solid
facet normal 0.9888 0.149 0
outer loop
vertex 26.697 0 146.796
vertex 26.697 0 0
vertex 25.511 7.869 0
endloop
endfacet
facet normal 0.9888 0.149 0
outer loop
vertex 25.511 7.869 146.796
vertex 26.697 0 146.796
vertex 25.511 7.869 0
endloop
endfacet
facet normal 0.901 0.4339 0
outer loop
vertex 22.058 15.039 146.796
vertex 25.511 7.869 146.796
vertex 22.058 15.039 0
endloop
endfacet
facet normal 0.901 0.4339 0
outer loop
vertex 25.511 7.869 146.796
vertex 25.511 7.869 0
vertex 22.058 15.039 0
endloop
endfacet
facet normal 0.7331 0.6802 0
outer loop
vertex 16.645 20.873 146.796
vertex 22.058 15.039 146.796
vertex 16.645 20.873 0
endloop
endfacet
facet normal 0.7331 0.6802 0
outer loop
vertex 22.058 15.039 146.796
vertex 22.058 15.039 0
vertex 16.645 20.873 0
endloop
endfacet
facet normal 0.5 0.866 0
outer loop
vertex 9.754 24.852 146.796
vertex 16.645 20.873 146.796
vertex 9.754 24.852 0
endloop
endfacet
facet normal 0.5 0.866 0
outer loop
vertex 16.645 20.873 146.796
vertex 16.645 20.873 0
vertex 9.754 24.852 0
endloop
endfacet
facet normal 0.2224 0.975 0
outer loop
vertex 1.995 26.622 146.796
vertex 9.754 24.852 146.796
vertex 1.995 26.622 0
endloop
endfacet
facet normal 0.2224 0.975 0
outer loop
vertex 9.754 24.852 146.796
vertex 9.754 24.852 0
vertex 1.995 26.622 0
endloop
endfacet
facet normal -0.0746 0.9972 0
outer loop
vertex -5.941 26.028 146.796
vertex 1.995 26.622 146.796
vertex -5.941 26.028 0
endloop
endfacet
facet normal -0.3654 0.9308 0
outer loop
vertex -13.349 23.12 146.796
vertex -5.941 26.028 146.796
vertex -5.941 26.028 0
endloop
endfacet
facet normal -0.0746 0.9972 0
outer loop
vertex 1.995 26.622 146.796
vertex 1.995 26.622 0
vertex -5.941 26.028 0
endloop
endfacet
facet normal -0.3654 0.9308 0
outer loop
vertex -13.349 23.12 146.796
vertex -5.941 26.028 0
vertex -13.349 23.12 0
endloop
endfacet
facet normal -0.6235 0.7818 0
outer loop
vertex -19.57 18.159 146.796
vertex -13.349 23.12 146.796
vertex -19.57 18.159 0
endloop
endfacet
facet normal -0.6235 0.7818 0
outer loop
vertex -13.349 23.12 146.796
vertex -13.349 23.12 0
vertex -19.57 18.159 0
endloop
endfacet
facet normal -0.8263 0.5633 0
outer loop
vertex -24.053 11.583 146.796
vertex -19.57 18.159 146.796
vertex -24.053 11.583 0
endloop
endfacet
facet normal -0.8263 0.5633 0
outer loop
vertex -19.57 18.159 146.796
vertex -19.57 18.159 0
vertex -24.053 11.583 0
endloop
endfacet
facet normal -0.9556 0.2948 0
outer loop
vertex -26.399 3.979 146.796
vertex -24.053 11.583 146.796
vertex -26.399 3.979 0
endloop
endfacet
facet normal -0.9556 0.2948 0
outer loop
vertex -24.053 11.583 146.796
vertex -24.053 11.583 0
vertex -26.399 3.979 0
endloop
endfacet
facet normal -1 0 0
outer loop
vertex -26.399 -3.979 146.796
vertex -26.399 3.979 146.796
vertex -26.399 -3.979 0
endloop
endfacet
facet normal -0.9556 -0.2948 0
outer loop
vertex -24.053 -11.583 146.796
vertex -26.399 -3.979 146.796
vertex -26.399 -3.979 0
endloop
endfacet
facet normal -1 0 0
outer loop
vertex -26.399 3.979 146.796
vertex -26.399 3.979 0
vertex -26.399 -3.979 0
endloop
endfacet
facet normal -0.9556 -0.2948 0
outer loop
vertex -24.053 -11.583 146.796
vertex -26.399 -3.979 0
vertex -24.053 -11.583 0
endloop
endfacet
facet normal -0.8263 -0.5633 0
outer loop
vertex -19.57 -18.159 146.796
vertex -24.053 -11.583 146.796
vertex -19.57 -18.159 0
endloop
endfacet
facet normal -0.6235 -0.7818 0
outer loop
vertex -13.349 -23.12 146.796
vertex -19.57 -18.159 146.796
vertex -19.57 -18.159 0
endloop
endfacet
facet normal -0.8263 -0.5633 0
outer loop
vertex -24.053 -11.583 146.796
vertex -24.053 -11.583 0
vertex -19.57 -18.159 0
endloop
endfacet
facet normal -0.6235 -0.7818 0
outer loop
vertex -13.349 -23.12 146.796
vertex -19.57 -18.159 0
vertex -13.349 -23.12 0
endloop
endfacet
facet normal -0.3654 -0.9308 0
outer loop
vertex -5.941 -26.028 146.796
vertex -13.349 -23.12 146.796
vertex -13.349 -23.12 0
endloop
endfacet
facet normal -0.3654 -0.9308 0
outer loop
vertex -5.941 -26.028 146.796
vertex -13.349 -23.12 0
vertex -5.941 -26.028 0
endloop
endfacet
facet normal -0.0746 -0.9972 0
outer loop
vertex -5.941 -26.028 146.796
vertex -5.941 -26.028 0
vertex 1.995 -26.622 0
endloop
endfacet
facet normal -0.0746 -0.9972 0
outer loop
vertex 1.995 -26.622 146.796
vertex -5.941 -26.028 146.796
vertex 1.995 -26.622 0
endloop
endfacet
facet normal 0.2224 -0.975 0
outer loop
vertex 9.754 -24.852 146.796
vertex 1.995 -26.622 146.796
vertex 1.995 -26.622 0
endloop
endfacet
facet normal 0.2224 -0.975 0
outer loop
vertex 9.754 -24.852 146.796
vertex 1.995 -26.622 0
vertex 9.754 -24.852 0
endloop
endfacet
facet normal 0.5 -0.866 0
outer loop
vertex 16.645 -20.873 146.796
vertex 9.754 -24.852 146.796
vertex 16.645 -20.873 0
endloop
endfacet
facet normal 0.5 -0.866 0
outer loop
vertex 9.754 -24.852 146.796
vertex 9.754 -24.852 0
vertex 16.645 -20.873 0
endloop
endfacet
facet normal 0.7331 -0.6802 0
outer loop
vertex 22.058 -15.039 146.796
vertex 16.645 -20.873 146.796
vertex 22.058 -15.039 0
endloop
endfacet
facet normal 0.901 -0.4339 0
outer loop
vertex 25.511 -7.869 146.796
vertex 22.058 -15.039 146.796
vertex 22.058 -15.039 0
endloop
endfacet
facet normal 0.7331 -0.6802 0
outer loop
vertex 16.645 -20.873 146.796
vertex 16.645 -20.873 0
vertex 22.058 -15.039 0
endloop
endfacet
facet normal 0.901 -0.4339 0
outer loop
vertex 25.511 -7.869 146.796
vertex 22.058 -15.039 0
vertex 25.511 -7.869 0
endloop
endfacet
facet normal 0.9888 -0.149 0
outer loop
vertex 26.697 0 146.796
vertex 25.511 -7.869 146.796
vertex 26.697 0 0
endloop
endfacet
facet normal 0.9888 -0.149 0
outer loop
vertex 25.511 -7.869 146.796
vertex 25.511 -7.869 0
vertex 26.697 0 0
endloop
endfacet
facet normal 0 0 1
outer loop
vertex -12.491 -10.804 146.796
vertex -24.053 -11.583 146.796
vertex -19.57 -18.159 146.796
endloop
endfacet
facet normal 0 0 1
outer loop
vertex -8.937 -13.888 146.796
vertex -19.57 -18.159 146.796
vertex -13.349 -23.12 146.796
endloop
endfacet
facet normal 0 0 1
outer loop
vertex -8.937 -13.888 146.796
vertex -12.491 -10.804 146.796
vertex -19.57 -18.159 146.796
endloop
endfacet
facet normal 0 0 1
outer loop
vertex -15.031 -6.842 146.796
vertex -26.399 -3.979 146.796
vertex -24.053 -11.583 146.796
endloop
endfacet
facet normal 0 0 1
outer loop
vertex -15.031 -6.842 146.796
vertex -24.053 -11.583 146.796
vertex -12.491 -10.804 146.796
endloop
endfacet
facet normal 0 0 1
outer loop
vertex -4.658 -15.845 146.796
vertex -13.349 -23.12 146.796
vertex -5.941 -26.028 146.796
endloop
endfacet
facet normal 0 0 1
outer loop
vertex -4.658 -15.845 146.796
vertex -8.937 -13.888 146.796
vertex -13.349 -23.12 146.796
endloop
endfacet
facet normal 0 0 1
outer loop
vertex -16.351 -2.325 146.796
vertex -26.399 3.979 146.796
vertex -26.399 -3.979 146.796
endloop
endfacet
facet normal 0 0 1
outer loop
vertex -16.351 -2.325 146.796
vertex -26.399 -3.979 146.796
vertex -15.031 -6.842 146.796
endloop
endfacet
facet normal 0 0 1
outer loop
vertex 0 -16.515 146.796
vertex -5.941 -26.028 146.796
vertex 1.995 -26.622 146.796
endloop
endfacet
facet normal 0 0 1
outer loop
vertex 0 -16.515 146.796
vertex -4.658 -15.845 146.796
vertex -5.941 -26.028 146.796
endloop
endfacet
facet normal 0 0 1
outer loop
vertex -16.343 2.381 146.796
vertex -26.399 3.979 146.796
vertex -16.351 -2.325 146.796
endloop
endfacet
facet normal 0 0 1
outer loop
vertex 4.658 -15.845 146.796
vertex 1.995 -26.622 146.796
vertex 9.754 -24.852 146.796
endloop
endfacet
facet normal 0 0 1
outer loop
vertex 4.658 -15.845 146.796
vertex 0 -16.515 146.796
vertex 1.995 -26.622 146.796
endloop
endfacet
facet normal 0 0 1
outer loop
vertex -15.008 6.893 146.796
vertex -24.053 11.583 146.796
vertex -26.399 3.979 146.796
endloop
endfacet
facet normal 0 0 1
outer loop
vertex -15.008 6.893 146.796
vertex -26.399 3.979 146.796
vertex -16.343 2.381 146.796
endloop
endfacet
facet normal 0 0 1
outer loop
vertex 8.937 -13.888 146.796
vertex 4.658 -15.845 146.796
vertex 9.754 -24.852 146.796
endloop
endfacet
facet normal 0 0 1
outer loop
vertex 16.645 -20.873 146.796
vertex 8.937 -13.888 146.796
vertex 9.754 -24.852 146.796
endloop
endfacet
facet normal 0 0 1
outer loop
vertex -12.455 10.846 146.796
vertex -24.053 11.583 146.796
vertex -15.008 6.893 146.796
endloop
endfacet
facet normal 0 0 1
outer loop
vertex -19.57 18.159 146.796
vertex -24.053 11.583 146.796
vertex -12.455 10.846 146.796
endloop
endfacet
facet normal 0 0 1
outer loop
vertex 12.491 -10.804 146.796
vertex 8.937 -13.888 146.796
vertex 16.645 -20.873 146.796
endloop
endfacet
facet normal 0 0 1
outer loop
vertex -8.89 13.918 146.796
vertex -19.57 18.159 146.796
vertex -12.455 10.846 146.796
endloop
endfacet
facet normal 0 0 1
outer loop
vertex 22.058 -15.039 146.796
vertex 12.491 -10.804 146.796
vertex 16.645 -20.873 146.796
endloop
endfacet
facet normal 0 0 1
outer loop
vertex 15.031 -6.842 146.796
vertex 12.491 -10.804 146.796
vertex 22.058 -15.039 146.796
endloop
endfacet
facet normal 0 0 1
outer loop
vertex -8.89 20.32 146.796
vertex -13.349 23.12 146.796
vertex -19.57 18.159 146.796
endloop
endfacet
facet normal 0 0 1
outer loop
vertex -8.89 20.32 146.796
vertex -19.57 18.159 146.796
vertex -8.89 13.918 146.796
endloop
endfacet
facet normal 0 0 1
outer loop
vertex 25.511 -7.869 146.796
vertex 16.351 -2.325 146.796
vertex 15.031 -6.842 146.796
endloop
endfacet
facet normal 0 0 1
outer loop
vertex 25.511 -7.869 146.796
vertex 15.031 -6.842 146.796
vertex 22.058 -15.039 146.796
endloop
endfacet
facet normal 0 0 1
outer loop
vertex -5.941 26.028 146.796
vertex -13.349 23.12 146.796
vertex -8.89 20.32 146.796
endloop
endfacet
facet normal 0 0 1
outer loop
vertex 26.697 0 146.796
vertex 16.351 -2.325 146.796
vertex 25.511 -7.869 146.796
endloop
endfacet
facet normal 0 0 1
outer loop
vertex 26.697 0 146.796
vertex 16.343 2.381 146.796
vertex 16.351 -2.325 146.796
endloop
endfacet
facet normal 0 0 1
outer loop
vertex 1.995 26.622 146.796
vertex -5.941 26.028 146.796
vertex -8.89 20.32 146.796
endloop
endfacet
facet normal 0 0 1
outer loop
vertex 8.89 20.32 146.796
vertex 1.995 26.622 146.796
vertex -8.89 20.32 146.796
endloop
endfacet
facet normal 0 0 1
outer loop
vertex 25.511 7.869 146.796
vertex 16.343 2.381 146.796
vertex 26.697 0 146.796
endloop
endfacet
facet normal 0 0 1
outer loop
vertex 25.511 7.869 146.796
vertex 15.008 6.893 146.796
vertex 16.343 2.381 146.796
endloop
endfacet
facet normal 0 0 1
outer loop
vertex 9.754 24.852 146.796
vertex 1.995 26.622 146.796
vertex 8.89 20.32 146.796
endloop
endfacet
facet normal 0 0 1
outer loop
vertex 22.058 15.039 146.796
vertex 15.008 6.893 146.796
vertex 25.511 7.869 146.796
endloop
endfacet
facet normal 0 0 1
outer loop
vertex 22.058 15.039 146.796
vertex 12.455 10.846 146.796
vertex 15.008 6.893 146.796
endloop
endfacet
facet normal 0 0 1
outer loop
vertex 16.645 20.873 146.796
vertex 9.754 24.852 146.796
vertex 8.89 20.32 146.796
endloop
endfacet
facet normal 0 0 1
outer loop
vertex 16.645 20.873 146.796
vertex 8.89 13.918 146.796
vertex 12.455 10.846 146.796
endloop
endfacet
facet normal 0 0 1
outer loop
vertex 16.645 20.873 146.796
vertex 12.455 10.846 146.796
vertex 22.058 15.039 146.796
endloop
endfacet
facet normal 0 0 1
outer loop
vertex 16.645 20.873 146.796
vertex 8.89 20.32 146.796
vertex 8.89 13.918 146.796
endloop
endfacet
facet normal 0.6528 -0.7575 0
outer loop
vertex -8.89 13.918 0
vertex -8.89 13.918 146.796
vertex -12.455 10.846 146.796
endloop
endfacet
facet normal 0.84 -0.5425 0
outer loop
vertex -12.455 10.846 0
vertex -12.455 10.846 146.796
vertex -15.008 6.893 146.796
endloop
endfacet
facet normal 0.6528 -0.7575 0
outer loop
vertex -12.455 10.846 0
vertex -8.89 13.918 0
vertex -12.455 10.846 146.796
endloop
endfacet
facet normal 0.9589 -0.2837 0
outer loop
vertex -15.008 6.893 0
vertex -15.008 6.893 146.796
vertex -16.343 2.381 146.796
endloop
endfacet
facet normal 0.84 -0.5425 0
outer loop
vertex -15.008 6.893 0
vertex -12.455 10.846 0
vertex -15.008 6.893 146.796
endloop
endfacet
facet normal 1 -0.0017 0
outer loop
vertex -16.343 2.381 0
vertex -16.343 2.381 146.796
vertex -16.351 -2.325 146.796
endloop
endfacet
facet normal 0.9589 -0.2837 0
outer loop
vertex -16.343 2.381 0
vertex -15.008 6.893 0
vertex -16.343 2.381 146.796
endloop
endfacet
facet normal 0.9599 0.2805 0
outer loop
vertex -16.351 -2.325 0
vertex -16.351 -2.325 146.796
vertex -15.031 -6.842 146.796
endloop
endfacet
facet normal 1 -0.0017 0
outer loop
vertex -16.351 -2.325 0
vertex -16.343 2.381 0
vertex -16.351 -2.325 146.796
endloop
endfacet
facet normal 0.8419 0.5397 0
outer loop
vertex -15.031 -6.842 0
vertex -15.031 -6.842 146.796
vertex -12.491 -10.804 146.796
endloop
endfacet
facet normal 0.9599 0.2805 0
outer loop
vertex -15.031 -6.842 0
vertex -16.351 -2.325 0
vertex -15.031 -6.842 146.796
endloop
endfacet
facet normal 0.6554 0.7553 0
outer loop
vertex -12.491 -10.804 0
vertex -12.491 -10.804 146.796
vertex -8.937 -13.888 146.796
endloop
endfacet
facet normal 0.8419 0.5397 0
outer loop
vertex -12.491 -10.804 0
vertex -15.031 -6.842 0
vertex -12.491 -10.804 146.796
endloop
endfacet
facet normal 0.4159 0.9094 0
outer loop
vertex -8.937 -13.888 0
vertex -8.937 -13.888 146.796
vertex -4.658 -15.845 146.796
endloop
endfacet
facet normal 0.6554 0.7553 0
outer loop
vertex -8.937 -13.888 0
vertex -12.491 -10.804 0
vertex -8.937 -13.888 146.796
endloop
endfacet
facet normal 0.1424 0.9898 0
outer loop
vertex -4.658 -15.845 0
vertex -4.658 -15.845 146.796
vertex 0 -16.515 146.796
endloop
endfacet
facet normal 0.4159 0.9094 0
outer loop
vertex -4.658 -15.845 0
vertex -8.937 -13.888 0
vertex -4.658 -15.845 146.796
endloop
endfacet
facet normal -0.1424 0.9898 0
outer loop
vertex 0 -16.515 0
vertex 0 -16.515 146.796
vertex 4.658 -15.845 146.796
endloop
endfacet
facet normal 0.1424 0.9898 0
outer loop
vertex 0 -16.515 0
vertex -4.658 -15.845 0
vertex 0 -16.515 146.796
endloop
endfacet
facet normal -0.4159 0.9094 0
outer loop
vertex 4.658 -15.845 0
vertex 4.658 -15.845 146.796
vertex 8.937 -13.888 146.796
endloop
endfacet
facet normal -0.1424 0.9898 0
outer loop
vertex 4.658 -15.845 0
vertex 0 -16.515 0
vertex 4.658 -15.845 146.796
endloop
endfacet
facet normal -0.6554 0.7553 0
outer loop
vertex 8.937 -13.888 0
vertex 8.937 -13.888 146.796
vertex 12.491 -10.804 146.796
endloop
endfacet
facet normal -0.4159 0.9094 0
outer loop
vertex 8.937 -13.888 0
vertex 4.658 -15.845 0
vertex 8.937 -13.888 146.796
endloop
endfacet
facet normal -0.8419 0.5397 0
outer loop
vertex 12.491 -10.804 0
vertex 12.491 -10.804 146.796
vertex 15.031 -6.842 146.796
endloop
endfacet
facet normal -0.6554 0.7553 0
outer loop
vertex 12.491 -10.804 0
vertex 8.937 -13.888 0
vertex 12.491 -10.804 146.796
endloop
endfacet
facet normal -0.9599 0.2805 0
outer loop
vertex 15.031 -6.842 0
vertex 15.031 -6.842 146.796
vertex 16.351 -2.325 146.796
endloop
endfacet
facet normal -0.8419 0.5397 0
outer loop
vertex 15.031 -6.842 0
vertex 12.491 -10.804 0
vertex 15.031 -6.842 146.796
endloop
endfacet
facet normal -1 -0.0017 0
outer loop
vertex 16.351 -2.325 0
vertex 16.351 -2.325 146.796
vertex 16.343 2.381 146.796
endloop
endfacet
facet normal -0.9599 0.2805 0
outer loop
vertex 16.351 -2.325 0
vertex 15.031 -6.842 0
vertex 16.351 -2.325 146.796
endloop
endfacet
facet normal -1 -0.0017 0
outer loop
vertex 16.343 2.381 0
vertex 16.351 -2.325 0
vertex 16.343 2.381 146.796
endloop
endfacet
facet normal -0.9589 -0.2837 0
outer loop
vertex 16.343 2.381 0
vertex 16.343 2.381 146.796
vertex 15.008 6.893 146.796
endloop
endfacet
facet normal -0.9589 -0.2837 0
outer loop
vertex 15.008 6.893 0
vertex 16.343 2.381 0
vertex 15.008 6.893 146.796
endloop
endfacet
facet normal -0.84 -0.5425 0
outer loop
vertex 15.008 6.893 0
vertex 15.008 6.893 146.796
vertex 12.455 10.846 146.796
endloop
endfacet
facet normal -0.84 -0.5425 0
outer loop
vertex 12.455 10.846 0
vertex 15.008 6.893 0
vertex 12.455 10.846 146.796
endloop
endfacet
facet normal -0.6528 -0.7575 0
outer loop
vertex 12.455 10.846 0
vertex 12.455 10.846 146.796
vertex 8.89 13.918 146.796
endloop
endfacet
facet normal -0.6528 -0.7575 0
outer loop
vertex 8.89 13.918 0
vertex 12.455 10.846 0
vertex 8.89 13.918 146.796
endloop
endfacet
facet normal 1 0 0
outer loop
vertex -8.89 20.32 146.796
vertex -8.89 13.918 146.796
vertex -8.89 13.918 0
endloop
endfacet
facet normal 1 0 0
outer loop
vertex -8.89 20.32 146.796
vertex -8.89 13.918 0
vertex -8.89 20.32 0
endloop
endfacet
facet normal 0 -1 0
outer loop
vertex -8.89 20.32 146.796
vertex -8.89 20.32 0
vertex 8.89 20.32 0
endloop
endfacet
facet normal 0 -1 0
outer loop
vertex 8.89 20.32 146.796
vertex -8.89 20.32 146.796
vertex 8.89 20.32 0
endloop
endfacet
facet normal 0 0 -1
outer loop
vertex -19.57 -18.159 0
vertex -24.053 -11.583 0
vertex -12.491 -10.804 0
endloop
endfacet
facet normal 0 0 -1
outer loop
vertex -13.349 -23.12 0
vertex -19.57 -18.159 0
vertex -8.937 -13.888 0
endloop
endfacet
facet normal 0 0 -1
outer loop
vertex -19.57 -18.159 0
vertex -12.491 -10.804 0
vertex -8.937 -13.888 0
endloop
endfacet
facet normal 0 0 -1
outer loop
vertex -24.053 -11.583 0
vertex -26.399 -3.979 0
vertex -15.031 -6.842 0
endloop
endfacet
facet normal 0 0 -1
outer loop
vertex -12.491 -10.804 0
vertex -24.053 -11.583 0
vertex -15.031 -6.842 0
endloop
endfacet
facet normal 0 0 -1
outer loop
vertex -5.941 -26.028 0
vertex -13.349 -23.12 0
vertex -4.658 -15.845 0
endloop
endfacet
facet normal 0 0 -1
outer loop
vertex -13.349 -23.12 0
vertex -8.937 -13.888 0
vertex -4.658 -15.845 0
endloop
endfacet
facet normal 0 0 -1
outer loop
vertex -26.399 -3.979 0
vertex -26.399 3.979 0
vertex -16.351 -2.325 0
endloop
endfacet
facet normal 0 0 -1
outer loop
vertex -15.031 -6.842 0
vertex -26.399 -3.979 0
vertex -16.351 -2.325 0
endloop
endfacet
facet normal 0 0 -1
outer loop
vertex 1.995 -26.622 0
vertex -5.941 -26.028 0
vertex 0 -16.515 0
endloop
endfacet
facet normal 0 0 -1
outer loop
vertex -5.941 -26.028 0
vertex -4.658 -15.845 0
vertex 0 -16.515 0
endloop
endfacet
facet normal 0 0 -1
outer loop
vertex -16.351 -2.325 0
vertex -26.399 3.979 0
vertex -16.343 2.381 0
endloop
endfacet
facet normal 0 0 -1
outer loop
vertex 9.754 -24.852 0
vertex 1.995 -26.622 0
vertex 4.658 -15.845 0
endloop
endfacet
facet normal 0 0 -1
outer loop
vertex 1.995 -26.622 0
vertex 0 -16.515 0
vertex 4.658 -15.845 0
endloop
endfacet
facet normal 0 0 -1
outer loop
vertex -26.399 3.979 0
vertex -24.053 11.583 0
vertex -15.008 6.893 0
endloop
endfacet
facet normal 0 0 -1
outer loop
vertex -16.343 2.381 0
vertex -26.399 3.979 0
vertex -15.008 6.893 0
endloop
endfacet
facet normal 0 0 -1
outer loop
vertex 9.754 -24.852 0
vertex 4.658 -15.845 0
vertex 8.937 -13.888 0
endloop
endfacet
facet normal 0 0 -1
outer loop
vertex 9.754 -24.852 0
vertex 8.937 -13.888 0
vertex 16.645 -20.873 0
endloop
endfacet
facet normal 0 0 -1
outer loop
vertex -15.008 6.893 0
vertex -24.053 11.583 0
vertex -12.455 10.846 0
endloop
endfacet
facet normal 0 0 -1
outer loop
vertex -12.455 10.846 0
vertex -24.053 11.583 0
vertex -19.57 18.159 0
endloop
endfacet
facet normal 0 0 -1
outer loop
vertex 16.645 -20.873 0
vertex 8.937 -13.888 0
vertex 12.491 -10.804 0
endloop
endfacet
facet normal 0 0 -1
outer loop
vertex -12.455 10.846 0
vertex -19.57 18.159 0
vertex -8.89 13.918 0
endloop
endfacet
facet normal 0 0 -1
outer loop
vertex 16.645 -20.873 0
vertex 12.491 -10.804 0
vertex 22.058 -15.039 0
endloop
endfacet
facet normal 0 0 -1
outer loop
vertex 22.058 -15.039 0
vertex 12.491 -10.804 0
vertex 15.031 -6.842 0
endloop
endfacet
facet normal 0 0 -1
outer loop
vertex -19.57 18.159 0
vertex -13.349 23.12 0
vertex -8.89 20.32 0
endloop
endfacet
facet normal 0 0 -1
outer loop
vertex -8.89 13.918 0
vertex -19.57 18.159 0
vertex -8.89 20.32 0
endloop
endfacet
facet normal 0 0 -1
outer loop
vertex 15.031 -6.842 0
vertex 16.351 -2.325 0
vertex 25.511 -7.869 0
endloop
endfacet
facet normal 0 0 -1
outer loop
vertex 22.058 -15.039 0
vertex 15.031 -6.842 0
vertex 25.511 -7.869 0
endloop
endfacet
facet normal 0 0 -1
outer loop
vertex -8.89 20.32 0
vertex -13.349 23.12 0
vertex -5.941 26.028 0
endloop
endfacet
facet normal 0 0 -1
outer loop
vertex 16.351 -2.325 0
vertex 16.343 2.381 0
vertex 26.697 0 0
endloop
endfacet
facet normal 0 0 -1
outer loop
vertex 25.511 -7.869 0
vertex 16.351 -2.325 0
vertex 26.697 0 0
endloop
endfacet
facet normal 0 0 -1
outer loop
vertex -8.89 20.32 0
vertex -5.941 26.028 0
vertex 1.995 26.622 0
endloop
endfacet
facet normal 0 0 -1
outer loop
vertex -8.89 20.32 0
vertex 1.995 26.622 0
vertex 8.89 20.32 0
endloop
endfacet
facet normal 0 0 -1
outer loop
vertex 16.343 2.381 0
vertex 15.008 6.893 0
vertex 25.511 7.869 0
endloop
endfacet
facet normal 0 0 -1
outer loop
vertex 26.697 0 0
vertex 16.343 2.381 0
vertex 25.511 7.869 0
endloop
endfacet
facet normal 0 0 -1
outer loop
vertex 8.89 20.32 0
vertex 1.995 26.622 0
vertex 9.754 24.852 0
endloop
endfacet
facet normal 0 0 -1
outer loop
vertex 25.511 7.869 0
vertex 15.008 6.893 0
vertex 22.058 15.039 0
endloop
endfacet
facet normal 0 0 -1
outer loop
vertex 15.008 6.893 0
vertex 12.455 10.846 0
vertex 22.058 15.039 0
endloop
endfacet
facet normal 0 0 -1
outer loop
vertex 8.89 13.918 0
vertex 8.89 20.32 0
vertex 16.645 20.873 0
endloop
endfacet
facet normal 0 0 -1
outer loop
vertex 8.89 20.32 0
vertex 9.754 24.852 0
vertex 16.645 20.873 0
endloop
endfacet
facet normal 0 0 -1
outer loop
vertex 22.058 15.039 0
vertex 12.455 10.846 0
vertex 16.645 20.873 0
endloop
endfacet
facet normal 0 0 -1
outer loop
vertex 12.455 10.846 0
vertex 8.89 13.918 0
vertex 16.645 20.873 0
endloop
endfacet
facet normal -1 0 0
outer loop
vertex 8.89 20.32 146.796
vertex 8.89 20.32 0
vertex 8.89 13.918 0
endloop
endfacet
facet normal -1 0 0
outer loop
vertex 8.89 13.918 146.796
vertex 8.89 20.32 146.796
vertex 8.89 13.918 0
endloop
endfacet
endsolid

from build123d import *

# Parameters (mm, degrees)
F0_R     = 26.697036
F0_R_2   = 16.515215
F1_DEPTH = 146.796286
F3_DEPTH = 146.796286


with BuildPart() as f1:
    # F0 (on Top) → F1 (new body)
    with BuildSketch(Plane.XY):
        Circle(F0_R)
        Circle(F0_R_2, mode=Mode.SUBTRACT)
    extrude(amount=F1_DEPTH)

    # F2 (on face) → F3 (cut, through all)
    with BuildSketch(Plane(origin=(0, 0, 0), x_dir=(1, 0, 0), z_dir=(0, 0, -1))):
        with BuildLine():
            Line((-8.89, -20.32), (8.89, -20.32))
            Line((8.89, -20.32), (8.89, -13.918341))
            ThreePointArc((8.89, -13.918341), (0, -16.515215), (-8.89, -13.918341))
            Line((-8.89, -13.918341), (-8.89, -20.32))
        make_face()
    extrude(amount=-F3_DEPTH, mode=Mode.SUBTRACT)


solid = f1.part
